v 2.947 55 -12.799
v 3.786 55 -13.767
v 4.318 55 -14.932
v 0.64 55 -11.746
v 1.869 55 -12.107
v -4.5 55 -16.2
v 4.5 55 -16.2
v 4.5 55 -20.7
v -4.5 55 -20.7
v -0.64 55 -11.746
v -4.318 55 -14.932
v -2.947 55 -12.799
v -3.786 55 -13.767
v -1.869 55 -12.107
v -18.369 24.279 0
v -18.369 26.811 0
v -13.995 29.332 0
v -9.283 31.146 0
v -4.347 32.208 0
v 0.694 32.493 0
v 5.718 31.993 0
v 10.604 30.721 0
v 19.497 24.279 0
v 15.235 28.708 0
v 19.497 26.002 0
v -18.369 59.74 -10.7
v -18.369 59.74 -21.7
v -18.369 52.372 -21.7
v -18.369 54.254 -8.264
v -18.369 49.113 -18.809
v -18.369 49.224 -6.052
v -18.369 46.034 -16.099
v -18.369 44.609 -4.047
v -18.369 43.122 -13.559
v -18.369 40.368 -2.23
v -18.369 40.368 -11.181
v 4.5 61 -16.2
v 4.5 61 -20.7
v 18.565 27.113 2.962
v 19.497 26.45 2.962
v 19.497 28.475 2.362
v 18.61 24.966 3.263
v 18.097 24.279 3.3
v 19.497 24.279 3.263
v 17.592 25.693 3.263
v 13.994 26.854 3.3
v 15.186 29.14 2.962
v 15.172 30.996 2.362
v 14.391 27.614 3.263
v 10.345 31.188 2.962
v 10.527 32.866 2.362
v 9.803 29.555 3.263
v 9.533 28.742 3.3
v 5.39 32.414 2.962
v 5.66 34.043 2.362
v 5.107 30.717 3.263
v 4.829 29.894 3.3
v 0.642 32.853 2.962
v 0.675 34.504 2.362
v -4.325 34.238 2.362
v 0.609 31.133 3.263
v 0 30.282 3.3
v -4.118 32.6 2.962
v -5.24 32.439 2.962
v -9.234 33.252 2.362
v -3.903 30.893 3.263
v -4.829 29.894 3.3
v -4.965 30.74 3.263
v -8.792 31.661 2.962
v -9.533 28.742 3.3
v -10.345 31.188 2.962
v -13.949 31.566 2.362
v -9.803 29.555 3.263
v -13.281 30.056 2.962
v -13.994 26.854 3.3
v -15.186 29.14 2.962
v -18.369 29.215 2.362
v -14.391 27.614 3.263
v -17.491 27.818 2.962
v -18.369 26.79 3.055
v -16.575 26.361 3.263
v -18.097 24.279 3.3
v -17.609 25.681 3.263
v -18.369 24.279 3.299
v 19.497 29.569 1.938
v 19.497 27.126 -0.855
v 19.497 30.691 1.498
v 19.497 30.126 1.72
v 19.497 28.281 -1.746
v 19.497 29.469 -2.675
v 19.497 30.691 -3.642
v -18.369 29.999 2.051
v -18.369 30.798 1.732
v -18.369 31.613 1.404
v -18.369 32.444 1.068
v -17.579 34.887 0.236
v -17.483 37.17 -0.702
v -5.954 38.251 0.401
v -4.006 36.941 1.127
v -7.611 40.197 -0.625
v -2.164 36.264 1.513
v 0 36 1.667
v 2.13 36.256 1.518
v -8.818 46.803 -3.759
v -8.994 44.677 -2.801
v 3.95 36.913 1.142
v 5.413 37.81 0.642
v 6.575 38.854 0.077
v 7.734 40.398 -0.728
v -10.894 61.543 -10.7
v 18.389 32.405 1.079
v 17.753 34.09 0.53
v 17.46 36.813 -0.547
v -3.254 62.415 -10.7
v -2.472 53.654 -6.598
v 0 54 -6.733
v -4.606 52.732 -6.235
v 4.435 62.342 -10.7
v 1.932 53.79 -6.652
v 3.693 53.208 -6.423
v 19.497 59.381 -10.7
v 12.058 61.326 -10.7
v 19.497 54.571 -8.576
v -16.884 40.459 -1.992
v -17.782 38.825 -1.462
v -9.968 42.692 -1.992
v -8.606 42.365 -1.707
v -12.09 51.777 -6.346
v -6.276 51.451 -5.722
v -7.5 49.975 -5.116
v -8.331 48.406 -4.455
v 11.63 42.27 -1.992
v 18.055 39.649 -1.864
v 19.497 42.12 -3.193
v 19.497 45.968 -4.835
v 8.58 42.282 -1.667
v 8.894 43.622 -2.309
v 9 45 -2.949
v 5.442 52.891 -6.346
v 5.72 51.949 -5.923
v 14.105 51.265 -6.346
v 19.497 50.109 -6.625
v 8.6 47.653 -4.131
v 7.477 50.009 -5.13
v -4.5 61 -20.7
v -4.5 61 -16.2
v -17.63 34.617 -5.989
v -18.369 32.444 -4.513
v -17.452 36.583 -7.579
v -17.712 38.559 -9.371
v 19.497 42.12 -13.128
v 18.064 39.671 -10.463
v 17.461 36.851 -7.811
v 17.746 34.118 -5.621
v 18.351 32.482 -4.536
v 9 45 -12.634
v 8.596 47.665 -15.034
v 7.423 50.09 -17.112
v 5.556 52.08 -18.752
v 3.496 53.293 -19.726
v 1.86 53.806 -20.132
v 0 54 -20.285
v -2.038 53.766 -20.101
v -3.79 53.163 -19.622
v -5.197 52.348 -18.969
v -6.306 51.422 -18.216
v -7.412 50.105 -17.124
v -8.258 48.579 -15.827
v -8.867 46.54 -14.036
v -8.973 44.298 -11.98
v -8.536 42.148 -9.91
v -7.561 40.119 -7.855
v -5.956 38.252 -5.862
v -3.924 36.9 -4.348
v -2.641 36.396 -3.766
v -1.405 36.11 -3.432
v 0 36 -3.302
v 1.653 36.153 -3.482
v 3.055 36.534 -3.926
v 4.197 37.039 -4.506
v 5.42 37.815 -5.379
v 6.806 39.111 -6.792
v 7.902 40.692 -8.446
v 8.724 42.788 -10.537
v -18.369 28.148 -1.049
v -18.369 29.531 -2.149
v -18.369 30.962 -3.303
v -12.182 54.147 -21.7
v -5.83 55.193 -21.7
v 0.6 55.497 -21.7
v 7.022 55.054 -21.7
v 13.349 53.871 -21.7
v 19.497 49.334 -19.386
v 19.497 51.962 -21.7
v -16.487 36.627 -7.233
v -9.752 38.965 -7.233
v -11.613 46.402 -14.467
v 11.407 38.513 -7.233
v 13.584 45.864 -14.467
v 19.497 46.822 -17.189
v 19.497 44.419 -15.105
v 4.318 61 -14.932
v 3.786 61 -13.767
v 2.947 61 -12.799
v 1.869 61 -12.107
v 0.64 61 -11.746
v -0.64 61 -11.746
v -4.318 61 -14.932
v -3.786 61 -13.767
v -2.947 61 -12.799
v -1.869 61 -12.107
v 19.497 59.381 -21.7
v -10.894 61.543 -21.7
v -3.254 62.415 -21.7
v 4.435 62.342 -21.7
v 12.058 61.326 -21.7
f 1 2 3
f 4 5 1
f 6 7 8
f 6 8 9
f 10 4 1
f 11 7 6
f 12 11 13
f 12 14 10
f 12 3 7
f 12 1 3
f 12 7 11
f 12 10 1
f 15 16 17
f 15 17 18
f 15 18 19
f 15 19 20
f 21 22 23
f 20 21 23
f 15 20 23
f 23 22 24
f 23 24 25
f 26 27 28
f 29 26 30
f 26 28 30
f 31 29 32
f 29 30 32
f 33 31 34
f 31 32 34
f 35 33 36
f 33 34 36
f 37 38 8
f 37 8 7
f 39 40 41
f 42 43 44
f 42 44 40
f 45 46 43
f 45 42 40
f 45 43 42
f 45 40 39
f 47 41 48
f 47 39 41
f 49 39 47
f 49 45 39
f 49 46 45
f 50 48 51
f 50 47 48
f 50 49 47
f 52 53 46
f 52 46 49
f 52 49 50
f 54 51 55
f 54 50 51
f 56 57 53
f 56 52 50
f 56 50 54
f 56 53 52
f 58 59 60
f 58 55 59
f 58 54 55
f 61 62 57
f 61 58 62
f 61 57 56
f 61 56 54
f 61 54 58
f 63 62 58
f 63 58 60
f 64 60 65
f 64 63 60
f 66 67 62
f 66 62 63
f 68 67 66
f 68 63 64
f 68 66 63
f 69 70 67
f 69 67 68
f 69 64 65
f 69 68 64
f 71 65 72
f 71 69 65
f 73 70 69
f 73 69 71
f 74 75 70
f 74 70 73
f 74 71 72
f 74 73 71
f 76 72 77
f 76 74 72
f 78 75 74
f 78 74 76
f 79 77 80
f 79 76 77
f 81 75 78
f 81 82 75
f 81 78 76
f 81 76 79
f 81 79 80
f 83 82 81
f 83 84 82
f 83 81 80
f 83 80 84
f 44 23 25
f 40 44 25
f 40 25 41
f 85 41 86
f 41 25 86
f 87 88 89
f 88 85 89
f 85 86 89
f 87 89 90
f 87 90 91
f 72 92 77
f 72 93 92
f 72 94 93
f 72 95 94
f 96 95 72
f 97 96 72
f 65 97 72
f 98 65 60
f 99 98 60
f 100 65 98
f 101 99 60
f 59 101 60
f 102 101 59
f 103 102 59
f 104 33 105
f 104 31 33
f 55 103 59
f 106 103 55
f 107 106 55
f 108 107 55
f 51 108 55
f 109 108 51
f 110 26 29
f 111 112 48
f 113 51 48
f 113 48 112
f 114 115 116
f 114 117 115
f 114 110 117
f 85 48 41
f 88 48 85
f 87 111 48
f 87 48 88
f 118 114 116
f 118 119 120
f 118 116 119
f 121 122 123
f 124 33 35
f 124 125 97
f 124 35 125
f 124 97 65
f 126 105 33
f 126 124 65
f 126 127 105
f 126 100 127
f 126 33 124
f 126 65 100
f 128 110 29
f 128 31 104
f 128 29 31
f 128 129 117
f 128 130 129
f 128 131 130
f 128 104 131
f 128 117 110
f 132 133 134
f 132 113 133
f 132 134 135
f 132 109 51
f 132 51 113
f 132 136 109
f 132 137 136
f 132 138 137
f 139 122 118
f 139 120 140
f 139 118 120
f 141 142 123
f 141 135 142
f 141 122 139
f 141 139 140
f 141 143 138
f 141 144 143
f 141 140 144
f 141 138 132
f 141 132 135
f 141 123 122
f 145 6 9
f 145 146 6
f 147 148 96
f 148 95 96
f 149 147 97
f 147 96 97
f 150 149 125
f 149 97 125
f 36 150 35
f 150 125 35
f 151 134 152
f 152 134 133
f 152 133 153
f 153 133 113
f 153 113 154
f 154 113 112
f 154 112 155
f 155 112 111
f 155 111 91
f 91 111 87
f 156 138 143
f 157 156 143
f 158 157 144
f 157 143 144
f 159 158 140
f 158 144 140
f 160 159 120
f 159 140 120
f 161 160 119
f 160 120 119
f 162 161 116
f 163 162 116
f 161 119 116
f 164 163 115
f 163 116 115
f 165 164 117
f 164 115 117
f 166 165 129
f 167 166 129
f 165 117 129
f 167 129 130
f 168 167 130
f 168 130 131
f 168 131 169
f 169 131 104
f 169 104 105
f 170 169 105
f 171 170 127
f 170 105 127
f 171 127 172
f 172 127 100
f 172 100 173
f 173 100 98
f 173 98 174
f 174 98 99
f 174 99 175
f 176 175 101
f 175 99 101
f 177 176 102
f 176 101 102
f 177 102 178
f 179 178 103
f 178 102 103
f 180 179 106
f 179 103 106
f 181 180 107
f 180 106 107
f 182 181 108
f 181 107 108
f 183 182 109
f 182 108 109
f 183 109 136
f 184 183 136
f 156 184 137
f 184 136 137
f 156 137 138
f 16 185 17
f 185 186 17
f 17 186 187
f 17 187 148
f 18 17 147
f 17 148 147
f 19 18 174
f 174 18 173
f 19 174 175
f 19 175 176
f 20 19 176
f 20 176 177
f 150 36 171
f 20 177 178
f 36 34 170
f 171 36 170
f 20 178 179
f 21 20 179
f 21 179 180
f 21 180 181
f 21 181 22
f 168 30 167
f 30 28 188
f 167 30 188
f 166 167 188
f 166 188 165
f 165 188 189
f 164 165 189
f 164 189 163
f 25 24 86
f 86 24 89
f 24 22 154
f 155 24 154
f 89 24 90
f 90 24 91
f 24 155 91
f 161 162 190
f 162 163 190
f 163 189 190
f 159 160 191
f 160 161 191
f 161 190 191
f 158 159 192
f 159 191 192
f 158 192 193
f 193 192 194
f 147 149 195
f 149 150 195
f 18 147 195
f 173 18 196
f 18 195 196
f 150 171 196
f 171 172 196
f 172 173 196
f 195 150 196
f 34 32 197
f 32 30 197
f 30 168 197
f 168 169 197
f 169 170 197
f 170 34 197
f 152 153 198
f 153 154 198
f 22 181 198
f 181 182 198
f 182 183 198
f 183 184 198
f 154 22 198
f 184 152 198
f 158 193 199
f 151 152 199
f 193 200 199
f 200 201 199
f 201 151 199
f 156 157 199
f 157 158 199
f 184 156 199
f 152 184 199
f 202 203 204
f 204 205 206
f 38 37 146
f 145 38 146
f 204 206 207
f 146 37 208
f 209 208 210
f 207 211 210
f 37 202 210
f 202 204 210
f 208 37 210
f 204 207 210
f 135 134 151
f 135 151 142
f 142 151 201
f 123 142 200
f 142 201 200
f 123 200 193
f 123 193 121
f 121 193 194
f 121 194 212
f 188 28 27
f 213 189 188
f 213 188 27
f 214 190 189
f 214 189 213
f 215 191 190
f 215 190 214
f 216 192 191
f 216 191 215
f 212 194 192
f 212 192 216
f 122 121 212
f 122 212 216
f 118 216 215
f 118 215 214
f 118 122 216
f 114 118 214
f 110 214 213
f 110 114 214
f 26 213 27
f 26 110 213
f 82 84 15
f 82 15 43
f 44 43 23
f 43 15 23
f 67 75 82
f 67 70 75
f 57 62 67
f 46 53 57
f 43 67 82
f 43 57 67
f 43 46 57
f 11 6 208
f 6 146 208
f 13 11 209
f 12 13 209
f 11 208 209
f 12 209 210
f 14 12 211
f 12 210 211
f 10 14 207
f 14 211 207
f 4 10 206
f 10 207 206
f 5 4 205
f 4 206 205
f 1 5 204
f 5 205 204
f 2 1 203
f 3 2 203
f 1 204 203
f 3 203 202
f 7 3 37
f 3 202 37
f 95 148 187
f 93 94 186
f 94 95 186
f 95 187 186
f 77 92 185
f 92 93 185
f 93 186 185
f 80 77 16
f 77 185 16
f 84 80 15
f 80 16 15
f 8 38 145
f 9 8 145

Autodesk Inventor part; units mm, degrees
ref_plane "YZ Plane" through (0, 0, 0) normal (1, 0, 0) x (0, 1, 0)
ref_plane "XY Plane" through (0, 0, 0) normal (0, 0, 1) x (1, 0, 0)
sketch "Sketch1" plane through (0, 0, 0) normal (0, 0, 1) x (1, 0, 0)
  circle A0 centre (0, 0) radius 11
  line L0 (-9.5, 5.5453) -> (-9.5, -5.5453)
  line L1 (9.5, 5.5453) -> (9.5, -5.5453)
  circle A1 centre (0, 0) radius 32.5
  dimension "d0" = 22
  dimension "d1" = 19
  dimension "d2" = 65
extrude "Extrusion1" add sketch "Sketch1" along normal blind 3.3 contours A0 L1 | L0 A0 | A1
sketch "Sketch2" plane through (0, 0, 0) normal (1, 0, 0) x (0, 1, 0)
  line L0 (32.5, 0) -> (-32.5, 0) projected
  line L1 (32.5, 0) -> (55.5, -21.7)
  line L2 (55.5, -21.7) -> (62.5, -21.7)
  line L3 (62.5, -21.7) -> (62.5, -10.7)
  line L4 (32.5, 3.3) -> (-32.5, 3.3) projected
  line L5 (32.5, 3.3) -> (62.5, -10.7)
  line L6 (0, 0) -> (0, -19.375) construction
  line L7 (32.5, 3.3) -> (32.5, 0)
  dimension "d8" = 7
  dimension "d9" = 25
  dimension "d10" = 11
  dimension "d11" = 30
revolve "Revolution1" add sketch "Sketch2" angle 360 about axis through (0, 0, 0) along (0, 0, -1)
fillet "Fillet1" radius 10 1 edges at (0, -32.5, 3.3)
ref_plane "Work Plane2" through (0, 61, 0) normal (0, 1, 0) x (-1, 0, 0)
sketch "Sketch3" plane through (0, 61, 0) normal (0, 1, 0) x (-1, 0, 0)
  circle A0 centre (0, -16.2) radius 4.5
  line L0 (4.5, -16.2) -> (4.5, -20.7)
  line L1 (-4.5, -20.7) -> (-4.5, -16.2)
  line L2 (-62.5, -21.7) -> (62.5, -21.7) projected
  line L3 (62.5, -21.7) -> (62.5, -11.7) construction
  line L4 (62.5, -10.7) -> (62.5, -21.7) projected
  line L5 (-9.5, 0) -> (9.5, 0) projected
  line L6 (-4.5, -20.7) -> (4.5, -20.7)
  point P0 (0, 0)
  point P1 (0, 0)
  point P2 (0, -20.7)
  dimension "d14" = 9
  dimension "d22" = 1
extrude "Extrusion2" cut sketch "Sketch3" against normal blind 6
sketch "Sketch4" plane through (0, 0, 3.3) normal (0, 0, 1) x (1, 0, 0)
  circle A0 centre (0, 45) radius 9
  point P0 (0, 0)
  dimension "d25" = 45
  dimension "d26" = 18
extrude "Extrusion3" cut sketch "Sketch4" against normal through all
pattern_circular "Circular Pattern1" count 10 over 360 about axis through (0, 0, -6.7) along (0, 0, 1) of "Extrusion3"
sketch "Sketch5" plane through (0, 0, -21.7) normal (0, 0, -1) x (-1, 0, 0)
  line L0 (82.923, -74.4217) -> (-85.9985, -74.4217)
  line L1 (-85.9985, -74.4217) -> (-85.9985, 73.4258)
  line L2 (-85.9985, 73.4258) -> (82.923, 73.4258)
  line L3 (82.923, 73.4258) -> (82.923, -74.4217)
  line L4 (-19.4974, 63.9822) -> (18.3694, 63.9822)
  line L5 (18.3694, 63.9822) -> (18.3694, 24.2787)
  line L6 (18.3694, 24.2787) -> (-19.4974, 24.2787)
  line L7 (-19.4974, 24.2787) -> (-19.4974, 63.9822)
  point P0 (0, 0)
extrude "Extrusion4" cut sketch "Sketch5" against normal through all
properties part number "CVT_Ring"
